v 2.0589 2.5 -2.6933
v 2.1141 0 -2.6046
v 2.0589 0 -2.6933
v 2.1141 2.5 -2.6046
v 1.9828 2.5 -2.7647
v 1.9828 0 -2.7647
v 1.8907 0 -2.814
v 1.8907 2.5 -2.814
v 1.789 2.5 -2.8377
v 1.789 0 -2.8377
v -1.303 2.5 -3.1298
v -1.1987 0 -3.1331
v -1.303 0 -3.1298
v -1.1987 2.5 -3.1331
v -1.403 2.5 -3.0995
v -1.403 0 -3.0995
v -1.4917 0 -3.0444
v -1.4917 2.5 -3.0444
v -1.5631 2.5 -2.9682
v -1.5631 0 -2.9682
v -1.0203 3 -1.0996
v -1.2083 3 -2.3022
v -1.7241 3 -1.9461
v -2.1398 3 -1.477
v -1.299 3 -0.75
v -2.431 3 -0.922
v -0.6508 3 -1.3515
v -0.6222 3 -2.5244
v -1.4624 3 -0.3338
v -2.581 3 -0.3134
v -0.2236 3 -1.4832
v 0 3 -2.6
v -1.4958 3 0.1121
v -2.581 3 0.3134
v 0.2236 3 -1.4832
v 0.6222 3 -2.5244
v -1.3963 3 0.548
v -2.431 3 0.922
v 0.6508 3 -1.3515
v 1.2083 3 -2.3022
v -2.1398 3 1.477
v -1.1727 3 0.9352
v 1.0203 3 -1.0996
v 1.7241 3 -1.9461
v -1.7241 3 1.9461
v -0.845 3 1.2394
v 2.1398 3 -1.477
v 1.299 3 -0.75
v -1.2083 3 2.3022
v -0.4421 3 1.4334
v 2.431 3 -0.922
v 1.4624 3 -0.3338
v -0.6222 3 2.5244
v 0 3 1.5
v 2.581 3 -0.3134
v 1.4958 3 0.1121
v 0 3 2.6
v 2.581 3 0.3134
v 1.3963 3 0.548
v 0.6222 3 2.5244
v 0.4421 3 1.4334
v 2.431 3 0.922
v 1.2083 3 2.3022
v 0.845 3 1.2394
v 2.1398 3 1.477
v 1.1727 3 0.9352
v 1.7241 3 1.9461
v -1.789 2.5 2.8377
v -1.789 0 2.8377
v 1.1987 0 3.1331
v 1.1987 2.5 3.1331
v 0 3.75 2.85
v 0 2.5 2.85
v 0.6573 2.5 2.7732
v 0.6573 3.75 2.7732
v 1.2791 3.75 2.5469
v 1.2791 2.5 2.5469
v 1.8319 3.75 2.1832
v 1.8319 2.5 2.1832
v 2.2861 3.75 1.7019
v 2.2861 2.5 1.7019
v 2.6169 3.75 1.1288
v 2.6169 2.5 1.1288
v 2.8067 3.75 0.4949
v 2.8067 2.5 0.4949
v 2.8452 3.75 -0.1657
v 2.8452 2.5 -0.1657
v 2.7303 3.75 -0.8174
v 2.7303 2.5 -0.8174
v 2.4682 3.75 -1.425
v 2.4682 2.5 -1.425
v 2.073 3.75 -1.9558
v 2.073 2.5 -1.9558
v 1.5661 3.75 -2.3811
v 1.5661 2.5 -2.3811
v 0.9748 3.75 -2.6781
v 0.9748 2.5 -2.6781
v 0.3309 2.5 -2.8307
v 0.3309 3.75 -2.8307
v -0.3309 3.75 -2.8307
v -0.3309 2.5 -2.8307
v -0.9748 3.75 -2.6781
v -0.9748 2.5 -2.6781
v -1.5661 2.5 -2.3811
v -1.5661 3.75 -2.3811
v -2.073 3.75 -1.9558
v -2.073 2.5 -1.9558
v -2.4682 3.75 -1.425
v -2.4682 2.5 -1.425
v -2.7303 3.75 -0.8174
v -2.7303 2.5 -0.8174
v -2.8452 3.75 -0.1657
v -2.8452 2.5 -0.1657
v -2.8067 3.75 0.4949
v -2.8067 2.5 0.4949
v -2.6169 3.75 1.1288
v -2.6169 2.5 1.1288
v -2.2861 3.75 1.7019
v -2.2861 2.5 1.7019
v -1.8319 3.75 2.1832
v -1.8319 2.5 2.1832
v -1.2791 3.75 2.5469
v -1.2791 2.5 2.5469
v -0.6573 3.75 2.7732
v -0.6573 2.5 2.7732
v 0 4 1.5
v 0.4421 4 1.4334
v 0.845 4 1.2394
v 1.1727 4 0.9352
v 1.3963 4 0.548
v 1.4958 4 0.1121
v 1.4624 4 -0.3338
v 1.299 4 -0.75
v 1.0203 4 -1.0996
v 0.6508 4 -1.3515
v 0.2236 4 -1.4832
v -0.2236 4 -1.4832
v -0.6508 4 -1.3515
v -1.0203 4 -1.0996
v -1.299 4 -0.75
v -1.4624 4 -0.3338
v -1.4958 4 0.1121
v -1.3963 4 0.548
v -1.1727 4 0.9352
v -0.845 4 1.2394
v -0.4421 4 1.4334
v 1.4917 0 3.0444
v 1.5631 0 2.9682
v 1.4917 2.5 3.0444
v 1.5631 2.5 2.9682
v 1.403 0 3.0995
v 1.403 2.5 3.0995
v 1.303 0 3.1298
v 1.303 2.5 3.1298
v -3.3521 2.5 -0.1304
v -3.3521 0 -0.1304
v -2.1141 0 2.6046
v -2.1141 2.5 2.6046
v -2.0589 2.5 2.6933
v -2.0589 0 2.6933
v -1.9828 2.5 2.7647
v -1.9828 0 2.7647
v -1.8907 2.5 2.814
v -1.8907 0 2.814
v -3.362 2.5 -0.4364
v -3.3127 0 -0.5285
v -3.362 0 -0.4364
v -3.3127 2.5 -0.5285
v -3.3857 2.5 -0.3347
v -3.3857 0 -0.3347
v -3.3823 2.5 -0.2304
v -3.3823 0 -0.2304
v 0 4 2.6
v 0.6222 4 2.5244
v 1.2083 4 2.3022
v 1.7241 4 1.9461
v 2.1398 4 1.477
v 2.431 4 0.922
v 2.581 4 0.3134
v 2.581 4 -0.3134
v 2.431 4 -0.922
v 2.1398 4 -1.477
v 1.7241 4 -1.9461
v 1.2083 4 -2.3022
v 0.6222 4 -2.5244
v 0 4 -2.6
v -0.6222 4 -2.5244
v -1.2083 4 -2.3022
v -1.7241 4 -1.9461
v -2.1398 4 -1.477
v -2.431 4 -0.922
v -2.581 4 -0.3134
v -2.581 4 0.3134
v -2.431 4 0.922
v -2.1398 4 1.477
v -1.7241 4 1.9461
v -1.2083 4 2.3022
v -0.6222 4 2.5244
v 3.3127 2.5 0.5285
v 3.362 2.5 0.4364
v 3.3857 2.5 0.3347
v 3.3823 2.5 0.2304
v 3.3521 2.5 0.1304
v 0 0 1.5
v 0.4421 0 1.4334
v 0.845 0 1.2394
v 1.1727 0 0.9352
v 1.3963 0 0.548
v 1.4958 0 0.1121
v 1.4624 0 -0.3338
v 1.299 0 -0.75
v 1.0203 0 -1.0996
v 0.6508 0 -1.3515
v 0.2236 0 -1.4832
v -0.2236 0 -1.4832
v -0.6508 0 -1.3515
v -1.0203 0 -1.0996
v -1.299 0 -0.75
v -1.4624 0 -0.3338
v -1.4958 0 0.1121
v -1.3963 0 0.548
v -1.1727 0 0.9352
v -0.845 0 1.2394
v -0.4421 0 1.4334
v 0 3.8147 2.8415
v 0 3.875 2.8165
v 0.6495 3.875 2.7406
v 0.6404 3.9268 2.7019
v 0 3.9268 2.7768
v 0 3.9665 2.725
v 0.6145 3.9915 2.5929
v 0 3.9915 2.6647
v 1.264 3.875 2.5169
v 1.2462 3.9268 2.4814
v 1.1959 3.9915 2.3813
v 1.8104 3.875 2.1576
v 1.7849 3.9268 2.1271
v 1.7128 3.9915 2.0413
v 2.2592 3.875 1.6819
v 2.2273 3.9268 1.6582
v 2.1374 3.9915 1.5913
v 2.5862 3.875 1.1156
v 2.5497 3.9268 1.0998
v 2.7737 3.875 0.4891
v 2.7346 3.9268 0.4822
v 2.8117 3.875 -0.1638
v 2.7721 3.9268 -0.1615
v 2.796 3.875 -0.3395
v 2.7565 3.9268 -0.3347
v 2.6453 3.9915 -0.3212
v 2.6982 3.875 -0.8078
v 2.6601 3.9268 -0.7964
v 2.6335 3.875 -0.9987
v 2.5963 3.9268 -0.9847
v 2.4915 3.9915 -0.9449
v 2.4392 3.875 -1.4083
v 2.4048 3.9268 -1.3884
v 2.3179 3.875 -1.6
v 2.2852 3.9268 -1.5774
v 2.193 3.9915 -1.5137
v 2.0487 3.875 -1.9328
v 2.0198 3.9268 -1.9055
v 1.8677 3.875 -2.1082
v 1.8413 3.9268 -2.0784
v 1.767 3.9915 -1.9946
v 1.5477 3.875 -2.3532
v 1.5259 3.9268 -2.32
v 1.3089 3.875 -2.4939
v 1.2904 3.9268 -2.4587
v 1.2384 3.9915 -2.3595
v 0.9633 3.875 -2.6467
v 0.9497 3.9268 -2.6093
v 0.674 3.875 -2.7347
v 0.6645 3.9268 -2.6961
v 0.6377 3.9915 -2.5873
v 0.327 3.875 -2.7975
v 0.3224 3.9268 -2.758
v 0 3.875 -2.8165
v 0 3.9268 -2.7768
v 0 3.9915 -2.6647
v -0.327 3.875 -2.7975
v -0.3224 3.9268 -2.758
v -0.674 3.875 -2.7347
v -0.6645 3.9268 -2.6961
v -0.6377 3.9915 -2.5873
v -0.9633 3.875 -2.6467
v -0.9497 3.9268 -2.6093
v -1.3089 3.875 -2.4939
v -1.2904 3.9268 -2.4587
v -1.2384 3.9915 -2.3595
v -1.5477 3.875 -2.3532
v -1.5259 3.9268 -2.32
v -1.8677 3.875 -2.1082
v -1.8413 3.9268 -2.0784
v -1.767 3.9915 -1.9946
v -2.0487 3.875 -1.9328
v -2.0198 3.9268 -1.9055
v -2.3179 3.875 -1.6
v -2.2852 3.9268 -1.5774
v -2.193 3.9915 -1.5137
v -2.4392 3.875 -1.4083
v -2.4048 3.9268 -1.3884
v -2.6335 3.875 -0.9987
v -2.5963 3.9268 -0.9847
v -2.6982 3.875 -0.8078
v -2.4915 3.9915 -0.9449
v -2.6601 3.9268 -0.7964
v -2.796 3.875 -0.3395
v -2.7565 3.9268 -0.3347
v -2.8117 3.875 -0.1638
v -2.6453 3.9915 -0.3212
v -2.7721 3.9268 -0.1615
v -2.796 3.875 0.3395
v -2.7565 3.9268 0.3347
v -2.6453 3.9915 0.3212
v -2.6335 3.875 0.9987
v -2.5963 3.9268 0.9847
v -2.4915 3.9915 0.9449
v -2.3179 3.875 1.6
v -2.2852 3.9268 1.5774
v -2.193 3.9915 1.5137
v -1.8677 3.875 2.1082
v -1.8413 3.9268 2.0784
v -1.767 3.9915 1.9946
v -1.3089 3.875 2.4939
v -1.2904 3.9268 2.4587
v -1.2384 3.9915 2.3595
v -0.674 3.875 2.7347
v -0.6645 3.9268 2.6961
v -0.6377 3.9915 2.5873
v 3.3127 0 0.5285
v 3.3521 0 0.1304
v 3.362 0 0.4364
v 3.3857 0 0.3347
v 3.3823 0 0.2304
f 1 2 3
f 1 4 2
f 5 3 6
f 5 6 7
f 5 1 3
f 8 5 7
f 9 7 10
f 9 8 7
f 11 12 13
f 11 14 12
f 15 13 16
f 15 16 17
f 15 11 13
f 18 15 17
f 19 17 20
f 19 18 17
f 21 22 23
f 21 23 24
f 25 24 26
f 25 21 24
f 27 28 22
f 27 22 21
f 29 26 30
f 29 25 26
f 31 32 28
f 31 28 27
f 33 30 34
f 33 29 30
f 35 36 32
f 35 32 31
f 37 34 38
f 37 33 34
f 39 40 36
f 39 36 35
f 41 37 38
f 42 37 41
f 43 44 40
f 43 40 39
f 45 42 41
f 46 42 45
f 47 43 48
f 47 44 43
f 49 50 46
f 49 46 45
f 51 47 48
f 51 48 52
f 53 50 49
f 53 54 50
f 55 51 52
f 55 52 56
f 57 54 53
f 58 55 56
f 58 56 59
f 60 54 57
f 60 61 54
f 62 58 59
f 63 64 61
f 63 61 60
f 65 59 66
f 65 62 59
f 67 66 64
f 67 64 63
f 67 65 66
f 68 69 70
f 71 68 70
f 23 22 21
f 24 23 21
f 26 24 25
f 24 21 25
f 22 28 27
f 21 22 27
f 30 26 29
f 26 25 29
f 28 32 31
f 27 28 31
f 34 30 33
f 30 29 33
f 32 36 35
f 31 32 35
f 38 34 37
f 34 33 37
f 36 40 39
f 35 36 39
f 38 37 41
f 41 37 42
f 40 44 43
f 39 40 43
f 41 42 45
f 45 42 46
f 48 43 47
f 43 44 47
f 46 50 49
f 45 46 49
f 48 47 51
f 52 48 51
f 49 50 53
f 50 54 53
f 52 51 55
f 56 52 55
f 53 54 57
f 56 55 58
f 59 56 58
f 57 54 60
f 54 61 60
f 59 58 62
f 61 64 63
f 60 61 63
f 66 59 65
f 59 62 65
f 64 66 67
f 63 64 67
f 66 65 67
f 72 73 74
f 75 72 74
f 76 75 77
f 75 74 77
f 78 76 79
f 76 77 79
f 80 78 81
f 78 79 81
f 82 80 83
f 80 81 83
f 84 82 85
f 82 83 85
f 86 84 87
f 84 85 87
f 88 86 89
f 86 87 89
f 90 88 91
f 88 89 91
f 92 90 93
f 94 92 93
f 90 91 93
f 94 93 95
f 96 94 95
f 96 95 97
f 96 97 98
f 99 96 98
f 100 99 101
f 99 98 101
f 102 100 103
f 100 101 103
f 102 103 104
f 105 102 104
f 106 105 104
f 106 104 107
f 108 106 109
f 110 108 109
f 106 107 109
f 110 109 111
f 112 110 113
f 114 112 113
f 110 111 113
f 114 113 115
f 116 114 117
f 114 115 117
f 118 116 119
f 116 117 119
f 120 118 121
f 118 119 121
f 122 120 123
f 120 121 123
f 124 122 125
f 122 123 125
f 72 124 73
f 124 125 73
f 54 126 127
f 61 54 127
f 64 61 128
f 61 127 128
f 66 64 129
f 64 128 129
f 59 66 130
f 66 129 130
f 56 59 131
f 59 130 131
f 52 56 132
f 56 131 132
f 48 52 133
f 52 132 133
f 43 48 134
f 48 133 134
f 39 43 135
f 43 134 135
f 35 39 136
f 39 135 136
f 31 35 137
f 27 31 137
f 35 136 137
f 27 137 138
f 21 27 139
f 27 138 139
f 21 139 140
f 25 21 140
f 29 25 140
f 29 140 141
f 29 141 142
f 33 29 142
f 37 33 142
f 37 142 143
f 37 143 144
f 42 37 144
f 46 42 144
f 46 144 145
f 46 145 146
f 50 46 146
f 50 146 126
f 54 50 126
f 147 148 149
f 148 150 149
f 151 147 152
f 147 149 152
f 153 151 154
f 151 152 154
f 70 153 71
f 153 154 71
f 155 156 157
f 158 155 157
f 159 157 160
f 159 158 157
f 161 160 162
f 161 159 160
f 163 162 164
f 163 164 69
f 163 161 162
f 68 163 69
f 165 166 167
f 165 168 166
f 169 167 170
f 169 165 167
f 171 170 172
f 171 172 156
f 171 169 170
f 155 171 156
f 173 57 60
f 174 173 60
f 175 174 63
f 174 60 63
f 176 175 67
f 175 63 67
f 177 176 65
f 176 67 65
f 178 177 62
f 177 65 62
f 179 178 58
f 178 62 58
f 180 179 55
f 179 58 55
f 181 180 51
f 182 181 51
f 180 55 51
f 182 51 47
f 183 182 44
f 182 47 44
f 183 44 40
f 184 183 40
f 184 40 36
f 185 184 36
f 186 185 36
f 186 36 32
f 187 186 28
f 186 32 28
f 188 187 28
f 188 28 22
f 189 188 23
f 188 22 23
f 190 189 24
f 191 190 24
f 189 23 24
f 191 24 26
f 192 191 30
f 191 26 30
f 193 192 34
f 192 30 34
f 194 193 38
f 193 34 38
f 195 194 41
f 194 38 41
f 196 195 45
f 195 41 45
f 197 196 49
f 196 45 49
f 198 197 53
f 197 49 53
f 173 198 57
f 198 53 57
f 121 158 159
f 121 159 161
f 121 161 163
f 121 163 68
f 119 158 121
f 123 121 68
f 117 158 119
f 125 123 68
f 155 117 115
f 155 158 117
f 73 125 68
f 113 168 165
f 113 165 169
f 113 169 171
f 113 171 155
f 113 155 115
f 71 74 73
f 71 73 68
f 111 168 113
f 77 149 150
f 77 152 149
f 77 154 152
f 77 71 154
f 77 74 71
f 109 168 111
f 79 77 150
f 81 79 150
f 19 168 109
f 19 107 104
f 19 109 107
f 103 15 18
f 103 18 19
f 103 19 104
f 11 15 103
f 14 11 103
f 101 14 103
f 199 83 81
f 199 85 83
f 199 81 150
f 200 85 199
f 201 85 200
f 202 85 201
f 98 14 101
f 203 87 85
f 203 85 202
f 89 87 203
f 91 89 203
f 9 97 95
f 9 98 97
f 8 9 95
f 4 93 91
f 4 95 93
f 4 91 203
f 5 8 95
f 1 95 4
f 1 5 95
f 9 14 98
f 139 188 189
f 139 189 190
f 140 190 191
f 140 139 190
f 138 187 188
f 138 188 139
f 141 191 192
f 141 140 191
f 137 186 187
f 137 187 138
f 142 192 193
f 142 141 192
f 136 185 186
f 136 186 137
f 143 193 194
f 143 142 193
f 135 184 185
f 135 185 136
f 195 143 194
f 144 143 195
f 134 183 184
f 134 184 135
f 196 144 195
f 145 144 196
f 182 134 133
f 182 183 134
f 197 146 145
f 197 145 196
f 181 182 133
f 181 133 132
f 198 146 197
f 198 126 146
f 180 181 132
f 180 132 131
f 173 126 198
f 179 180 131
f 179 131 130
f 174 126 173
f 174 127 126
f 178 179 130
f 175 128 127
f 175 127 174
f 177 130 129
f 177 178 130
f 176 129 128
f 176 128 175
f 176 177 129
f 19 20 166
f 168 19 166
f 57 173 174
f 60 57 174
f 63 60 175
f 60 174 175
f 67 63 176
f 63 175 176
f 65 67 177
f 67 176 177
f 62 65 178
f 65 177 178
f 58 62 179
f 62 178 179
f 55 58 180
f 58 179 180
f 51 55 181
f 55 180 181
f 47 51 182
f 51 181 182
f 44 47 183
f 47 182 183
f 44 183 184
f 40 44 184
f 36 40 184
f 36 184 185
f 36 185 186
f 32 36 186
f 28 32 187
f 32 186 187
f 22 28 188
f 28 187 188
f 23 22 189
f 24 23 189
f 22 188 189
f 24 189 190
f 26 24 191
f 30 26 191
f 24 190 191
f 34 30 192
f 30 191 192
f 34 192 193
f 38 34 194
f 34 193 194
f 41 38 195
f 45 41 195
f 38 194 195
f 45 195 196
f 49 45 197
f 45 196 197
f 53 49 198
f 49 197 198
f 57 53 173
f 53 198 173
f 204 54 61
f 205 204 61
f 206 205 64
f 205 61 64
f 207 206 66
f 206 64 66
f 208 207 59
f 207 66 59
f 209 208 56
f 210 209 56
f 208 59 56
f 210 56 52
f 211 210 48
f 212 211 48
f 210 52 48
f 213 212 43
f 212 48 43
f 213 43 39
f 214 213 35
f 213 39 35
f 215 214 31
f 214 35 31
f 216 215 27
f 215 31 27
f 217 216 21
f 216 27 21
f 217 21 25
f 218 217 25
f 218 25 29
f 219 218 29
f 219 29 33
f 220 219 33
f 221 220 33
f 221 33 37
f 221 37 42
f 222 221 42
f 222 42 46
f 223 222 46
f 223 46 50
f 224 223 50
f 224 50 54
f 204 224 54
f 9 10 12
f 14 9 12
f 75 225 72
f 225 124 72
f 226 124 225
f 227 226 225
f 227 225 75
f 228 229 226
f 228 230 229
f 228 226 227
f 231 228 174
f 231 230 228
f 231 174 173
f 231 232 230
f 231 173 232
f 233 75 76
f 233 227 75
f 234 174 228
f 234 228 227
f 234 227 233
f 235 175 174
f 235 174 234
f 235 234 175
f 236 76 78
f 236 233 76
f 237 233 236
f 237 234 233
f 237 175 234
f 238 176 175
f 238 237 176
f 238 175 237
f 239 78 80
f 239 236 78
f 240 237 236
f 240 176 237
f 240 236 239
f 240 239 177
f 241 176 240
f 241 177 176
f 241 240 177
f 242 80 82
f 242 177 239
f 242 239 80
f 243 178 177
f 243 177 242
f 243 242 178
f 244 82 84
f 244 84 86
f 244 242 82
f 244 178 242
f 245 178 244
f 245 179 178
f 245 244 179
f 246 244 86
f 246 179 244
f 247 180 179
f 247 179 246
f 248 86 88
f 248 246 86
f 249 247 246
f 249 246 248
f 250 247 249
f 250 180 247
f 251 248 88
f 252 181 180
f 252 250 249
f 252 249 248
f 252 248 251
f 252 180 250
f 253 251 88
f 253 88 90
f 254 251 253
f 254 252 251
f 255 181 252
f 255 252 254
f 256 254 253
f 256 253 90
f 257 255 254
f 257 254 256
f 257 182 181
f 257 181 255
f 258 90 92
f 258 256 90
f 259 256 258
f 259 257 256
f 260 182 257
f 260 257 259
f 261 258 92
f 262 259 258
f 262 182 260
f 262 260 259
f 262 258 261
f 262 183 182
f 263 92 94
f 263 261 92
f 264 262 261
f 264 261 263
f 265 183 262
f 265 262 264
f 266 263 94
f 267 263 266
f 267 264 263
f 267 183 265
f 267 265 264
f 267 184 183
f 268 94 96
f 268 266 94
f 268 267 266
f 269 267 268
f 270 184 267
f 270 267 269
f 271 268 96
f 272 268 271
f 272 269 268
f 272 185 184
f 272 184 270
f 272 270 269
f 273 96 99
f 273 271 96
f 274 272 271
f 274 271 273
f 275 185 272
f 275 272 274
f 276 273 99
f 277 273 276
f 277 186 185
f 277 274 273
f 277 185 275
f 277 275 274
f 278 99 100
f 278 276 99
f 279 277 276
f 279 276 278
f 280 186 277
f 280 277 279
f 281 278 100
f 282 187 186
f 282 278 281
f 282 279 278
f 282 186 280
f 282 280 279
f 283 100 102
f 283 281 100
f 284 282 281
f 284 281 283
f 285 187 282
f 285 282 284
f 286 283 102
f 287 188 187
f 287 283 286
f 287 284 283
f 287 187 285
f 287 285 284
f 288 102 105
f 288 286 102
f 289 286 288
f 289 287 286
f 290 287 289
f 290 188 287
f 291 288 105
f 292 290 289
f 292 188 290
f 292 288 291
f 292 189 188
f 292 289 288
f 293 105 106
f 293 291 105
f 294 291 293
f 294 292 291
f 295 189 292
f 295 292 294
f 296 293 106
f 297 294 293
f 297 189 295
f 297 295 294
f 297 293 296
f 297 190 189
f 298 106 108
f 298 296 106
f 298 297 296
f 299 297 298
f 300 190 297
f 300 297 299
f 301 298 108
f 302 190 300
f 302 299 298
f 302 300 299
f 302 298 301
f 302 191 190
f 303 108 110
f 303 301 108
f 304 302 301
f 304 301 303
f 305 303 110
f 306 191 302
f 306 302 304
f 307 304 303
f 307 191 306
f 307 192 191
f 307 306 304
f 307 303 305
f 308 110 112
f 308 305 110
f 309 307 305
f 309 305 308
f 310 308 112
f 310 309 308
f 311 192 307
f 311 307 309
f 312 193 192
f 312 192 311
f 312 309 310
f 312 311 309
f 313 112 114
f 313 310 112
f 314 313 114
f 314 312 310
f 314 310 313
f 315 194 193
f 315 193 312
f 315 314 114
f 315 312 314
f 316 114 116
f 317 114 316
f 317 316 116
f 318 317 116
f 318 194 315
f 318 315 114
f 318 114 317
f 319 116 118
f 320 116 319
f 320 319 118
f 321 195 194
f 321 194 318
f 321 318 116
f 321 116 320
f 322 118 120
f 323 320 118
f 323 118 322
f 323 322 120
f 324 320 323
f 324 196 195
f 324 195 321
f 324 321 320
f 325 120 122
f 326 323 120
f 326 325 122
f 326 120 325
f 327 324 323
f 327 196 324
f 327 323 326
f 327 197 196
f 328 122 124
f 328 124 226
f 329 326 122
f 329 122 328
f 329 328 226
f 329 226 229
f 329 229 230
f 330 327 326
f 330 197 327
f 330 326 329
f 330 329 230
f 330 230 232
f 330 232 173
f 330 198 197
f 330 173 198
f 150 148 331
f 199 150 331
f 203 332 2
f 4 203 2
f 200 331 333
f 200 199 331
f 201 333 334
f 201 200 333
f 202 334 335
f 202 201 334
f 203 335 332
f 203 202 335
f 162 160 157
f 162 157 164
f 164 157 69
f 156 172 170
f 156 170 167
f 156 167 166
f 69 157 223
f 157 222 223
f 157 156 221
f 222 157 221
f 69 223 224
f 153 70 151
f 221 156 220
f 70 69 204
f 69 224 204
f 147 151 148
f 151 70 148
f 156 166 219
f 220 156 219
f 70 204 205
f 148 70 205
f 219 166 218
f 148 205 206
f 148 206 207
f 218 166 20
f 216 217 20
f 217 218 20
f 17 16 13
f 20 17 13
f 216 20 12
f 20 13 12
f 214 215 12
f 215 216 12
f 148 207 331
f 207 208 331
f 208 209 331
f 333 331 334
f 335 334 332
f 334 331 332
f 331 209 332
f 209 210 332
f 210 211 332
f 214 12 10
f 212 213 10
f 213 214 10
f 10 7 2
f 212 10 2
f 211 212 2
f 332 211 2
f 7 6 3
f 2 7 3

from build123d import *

# Parameters (mm, degrees)
BOSS_EXTRUDE1_DEPTH = 2.5
FILLET1_R           = 0.4
SKETCH2_R           = 2.85
BOSS_EXTRUDE2_DEPTH = 1.5
FILLET2_R           = 0.25
SKETCH5_R           = 2.6
SKETCH5_R_2         = 1.25
CUT_EXTRUDE2_DEPTH  = 1
SKETCH6_R           = 2.6
BOSS_EXTRUDE6_DEPTH = 1
SKETCH7_R           = 1.5
CUT_EXTRUDE3_DEPTH  = 7.107776145


with BuildPart() as part:
    # Sketch1 → Boss-Extrude1 (new body)
    with BuildSketch(Plane(origin=(0, 0, 0), x_dir=(1, 0, 0), z_dir=(0, 1, 0))):
        Polygon((1.428472824, -3.155862068), (3.447293134, -0.34083728), (2.01882031, 2.815024788), (-1.428472824, 3.155862068), (-3.447293134, 0.34083728), (-2.01882031, -2.815024788), align=None)
    extrude(amount=BOSS_EXTRUDE1_DEPTH)

    # Fillet1
    fillet1_edges = [part.edges().sort_by_distance(p)[0] for p in [
        (-2.01882031, 1.25, 2.815024788),
        (-3.447293134, 1.25, -0.34083728),
        (-1.428472824, 1.25, -3.155862068),
        (2.01882031, 1.25, -2.815024788),
        (3.447293134, 1.25, 0.34083728),
        (1.428472824, 1.25, 3.155862068),
    ]]
    fillet(fillet1_edges, radius=FILLET1_R)

    # Sketch2 → Boss-Extrude2 (add)
    with BuildSketch(Plane(origin=(0, 2.5, 0), x_dir=(1, 0, 0), z_dir=(0, 1, 0))):
        with Locations(Location((0, 0, 0), (0, 0, 270))):
            Circle(SKETCH2_R)
    extrude(amount=BOSS_EXTRUDE2_DEPTH)

    # Fillet2
    fillet2_edges = [part.edges().sort_by_distance(p)[0] for p in [
        (0, 4, -2.85),
    ]]
    fillet(fillet2_edges, radius=FILLET2_R)

    # Sketch5 → Cut-Extrude2 (cut)
    with BuildSketch(Plane(origin=(0, 4, 0), x_dir=(1, 0, 0), z_dir=(0, 1, 0))):
        with Locations(Location((0, 0, 0), (0, 0, 270))):
            Circle(SKETCH5_R)
        with Locations(Location((0, 0, 0), (0, 0, 270))):
            Circle(SKETCH5_R_2, mode=Mode.SUBTRACT)
    extrude(amount=-CUT_EXTRUDE2_DEPTH, mode=Mode.SUBTRACT)


with BuildPart() as body_2:
    # Sketch6 → Boss-Extrude6 (new body)
    with BuildSketch(Plane(origin=(0, 3, 0), x_dir=(1, 0, 0), z_dir=(0, 1, 0))):
        with Locations(Location((0, 0, 0), (0, 0, 270))):
            Circle(SKETCH6_R)
    extrude(amount=BOSS_EXTRUDE6_DEPTH)


with BuildPart() as cut_extrude3_tool:
    # Sketch7 → Cut-Extrude3 (new, through all)
    with BuildSketch(Plane(origin=(0, 4, 0), x_dir=(1, 0, 0), z_dir=(0, 1, 0))):
        with Locations(Location((0, 0, 0), (0, 0, 270))):
            Circle(SKETCH7_R)
    extrude(amount=-CUT_EXTRUDE3_DEPTH)


with BuildPart() as part_1:
    add(part.part)

    # Cut-Extrude3: cut by cut_extrude3_tool
    add(cut_extrude3_tool.part, mode=Mode.SUBTRACT)


with BuildPart() as body_2_1:
    add(body_2.part)

    # Cut-Extrude3: cut by cut_extrude3_tool
    add(cut_extrude3_tool.part, mode=Mode.SUBTRACT)


solid = Compound([part_1.part, body_2_1.part])
